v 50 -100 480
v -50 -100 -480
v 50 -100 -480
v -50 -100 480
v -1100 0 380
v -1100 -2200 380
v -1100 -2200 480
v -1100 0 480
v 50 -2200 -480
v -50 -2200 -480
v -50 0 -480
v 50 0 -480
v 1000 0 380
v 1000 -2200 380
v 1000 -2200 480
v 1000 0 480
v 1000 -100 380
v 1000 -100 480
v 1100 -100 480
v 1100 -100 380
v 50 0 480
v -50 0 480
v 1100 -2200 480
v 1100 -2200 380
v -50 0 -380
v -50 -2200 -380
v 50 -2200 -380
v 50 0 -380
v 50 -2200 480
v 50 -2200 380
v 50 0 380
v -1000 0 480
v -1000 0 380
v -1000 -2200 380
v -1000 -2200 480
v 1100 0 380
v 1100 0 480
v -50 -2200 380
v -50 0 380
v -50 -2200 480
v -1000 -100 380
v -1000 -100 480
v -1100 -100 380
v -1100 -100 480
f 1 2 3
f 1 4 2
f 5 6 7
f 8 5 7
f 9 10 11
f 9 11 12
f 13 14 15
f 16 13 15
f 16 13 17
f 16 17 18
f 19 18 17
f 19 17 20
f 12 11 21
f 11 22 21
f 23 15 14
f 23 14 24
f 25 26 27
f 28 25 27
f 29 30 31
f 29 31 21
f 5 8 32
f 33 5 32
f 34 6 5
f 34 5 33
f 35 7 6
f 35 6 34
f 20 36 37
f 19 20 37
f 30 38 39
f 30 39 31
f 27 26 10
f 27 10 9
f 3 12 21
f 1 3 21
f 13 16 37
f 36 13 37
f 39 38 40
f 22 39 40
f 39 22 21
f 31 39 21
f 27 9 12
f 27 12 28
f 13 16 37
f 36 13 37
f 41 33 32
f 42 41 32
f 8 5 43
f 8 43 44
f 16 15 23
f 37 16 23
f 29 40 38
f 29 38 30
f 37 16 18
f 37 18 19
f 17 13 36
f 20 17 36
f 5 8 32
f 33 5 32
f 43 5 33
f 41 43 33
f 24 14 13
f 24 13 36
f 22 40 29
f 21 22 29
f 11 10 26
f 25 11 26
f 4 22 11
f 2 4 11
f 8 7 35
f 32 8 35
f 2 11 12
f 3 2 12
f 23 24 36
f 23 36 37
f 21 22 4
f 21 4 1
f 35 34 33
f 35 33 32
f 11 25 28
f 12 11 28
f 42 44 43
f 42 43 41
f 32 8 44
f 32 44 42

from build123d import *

# Parameters (mm, degrees)
F0_W     = 100
F0_H     = 100
F1_DEPTH = 2200
F0_H_2   = 760
F2_DEPTH = 100


with BuildPart() as f1:
    # F0 (on Front) → F1 (new body)
    with BuildSketch(Plane.XZ):
        with Locations((0, 430)):
            Rectangle(F0_W, F0_H)
        with Locations((1050, 430)):
            Rectangle(F0_W, F0_H)
        with Locations((0, -430)):
            Rectangle(F0_W, F0_H)
        with Locations((-1050, 430)):
            Rectangle(F0_W, F0_H)
    extrude(amount=F1_DEPTH)


with BuildPart() as f2:
    # F0 (on Front) → F2 (new body)
    with BuildSketch(Plane.XZ):
        with Locations((0, -430)):
            Rectangle(F0_W, F0_H)
        with Locations((-1050, 430)):
            Rectangle(F0_W, F0_H)
        with Locations((0, 430)):
            Rectangle(F0_W, F0_H)
        with Locations((1050, 430)):
            Rectangle(F0_W, F0_H)
        Rectangle(F0_W, F0_H_2)
    extrude(amount=F2_DEPTH)


solid = Compound([f1.part, f2.part])
